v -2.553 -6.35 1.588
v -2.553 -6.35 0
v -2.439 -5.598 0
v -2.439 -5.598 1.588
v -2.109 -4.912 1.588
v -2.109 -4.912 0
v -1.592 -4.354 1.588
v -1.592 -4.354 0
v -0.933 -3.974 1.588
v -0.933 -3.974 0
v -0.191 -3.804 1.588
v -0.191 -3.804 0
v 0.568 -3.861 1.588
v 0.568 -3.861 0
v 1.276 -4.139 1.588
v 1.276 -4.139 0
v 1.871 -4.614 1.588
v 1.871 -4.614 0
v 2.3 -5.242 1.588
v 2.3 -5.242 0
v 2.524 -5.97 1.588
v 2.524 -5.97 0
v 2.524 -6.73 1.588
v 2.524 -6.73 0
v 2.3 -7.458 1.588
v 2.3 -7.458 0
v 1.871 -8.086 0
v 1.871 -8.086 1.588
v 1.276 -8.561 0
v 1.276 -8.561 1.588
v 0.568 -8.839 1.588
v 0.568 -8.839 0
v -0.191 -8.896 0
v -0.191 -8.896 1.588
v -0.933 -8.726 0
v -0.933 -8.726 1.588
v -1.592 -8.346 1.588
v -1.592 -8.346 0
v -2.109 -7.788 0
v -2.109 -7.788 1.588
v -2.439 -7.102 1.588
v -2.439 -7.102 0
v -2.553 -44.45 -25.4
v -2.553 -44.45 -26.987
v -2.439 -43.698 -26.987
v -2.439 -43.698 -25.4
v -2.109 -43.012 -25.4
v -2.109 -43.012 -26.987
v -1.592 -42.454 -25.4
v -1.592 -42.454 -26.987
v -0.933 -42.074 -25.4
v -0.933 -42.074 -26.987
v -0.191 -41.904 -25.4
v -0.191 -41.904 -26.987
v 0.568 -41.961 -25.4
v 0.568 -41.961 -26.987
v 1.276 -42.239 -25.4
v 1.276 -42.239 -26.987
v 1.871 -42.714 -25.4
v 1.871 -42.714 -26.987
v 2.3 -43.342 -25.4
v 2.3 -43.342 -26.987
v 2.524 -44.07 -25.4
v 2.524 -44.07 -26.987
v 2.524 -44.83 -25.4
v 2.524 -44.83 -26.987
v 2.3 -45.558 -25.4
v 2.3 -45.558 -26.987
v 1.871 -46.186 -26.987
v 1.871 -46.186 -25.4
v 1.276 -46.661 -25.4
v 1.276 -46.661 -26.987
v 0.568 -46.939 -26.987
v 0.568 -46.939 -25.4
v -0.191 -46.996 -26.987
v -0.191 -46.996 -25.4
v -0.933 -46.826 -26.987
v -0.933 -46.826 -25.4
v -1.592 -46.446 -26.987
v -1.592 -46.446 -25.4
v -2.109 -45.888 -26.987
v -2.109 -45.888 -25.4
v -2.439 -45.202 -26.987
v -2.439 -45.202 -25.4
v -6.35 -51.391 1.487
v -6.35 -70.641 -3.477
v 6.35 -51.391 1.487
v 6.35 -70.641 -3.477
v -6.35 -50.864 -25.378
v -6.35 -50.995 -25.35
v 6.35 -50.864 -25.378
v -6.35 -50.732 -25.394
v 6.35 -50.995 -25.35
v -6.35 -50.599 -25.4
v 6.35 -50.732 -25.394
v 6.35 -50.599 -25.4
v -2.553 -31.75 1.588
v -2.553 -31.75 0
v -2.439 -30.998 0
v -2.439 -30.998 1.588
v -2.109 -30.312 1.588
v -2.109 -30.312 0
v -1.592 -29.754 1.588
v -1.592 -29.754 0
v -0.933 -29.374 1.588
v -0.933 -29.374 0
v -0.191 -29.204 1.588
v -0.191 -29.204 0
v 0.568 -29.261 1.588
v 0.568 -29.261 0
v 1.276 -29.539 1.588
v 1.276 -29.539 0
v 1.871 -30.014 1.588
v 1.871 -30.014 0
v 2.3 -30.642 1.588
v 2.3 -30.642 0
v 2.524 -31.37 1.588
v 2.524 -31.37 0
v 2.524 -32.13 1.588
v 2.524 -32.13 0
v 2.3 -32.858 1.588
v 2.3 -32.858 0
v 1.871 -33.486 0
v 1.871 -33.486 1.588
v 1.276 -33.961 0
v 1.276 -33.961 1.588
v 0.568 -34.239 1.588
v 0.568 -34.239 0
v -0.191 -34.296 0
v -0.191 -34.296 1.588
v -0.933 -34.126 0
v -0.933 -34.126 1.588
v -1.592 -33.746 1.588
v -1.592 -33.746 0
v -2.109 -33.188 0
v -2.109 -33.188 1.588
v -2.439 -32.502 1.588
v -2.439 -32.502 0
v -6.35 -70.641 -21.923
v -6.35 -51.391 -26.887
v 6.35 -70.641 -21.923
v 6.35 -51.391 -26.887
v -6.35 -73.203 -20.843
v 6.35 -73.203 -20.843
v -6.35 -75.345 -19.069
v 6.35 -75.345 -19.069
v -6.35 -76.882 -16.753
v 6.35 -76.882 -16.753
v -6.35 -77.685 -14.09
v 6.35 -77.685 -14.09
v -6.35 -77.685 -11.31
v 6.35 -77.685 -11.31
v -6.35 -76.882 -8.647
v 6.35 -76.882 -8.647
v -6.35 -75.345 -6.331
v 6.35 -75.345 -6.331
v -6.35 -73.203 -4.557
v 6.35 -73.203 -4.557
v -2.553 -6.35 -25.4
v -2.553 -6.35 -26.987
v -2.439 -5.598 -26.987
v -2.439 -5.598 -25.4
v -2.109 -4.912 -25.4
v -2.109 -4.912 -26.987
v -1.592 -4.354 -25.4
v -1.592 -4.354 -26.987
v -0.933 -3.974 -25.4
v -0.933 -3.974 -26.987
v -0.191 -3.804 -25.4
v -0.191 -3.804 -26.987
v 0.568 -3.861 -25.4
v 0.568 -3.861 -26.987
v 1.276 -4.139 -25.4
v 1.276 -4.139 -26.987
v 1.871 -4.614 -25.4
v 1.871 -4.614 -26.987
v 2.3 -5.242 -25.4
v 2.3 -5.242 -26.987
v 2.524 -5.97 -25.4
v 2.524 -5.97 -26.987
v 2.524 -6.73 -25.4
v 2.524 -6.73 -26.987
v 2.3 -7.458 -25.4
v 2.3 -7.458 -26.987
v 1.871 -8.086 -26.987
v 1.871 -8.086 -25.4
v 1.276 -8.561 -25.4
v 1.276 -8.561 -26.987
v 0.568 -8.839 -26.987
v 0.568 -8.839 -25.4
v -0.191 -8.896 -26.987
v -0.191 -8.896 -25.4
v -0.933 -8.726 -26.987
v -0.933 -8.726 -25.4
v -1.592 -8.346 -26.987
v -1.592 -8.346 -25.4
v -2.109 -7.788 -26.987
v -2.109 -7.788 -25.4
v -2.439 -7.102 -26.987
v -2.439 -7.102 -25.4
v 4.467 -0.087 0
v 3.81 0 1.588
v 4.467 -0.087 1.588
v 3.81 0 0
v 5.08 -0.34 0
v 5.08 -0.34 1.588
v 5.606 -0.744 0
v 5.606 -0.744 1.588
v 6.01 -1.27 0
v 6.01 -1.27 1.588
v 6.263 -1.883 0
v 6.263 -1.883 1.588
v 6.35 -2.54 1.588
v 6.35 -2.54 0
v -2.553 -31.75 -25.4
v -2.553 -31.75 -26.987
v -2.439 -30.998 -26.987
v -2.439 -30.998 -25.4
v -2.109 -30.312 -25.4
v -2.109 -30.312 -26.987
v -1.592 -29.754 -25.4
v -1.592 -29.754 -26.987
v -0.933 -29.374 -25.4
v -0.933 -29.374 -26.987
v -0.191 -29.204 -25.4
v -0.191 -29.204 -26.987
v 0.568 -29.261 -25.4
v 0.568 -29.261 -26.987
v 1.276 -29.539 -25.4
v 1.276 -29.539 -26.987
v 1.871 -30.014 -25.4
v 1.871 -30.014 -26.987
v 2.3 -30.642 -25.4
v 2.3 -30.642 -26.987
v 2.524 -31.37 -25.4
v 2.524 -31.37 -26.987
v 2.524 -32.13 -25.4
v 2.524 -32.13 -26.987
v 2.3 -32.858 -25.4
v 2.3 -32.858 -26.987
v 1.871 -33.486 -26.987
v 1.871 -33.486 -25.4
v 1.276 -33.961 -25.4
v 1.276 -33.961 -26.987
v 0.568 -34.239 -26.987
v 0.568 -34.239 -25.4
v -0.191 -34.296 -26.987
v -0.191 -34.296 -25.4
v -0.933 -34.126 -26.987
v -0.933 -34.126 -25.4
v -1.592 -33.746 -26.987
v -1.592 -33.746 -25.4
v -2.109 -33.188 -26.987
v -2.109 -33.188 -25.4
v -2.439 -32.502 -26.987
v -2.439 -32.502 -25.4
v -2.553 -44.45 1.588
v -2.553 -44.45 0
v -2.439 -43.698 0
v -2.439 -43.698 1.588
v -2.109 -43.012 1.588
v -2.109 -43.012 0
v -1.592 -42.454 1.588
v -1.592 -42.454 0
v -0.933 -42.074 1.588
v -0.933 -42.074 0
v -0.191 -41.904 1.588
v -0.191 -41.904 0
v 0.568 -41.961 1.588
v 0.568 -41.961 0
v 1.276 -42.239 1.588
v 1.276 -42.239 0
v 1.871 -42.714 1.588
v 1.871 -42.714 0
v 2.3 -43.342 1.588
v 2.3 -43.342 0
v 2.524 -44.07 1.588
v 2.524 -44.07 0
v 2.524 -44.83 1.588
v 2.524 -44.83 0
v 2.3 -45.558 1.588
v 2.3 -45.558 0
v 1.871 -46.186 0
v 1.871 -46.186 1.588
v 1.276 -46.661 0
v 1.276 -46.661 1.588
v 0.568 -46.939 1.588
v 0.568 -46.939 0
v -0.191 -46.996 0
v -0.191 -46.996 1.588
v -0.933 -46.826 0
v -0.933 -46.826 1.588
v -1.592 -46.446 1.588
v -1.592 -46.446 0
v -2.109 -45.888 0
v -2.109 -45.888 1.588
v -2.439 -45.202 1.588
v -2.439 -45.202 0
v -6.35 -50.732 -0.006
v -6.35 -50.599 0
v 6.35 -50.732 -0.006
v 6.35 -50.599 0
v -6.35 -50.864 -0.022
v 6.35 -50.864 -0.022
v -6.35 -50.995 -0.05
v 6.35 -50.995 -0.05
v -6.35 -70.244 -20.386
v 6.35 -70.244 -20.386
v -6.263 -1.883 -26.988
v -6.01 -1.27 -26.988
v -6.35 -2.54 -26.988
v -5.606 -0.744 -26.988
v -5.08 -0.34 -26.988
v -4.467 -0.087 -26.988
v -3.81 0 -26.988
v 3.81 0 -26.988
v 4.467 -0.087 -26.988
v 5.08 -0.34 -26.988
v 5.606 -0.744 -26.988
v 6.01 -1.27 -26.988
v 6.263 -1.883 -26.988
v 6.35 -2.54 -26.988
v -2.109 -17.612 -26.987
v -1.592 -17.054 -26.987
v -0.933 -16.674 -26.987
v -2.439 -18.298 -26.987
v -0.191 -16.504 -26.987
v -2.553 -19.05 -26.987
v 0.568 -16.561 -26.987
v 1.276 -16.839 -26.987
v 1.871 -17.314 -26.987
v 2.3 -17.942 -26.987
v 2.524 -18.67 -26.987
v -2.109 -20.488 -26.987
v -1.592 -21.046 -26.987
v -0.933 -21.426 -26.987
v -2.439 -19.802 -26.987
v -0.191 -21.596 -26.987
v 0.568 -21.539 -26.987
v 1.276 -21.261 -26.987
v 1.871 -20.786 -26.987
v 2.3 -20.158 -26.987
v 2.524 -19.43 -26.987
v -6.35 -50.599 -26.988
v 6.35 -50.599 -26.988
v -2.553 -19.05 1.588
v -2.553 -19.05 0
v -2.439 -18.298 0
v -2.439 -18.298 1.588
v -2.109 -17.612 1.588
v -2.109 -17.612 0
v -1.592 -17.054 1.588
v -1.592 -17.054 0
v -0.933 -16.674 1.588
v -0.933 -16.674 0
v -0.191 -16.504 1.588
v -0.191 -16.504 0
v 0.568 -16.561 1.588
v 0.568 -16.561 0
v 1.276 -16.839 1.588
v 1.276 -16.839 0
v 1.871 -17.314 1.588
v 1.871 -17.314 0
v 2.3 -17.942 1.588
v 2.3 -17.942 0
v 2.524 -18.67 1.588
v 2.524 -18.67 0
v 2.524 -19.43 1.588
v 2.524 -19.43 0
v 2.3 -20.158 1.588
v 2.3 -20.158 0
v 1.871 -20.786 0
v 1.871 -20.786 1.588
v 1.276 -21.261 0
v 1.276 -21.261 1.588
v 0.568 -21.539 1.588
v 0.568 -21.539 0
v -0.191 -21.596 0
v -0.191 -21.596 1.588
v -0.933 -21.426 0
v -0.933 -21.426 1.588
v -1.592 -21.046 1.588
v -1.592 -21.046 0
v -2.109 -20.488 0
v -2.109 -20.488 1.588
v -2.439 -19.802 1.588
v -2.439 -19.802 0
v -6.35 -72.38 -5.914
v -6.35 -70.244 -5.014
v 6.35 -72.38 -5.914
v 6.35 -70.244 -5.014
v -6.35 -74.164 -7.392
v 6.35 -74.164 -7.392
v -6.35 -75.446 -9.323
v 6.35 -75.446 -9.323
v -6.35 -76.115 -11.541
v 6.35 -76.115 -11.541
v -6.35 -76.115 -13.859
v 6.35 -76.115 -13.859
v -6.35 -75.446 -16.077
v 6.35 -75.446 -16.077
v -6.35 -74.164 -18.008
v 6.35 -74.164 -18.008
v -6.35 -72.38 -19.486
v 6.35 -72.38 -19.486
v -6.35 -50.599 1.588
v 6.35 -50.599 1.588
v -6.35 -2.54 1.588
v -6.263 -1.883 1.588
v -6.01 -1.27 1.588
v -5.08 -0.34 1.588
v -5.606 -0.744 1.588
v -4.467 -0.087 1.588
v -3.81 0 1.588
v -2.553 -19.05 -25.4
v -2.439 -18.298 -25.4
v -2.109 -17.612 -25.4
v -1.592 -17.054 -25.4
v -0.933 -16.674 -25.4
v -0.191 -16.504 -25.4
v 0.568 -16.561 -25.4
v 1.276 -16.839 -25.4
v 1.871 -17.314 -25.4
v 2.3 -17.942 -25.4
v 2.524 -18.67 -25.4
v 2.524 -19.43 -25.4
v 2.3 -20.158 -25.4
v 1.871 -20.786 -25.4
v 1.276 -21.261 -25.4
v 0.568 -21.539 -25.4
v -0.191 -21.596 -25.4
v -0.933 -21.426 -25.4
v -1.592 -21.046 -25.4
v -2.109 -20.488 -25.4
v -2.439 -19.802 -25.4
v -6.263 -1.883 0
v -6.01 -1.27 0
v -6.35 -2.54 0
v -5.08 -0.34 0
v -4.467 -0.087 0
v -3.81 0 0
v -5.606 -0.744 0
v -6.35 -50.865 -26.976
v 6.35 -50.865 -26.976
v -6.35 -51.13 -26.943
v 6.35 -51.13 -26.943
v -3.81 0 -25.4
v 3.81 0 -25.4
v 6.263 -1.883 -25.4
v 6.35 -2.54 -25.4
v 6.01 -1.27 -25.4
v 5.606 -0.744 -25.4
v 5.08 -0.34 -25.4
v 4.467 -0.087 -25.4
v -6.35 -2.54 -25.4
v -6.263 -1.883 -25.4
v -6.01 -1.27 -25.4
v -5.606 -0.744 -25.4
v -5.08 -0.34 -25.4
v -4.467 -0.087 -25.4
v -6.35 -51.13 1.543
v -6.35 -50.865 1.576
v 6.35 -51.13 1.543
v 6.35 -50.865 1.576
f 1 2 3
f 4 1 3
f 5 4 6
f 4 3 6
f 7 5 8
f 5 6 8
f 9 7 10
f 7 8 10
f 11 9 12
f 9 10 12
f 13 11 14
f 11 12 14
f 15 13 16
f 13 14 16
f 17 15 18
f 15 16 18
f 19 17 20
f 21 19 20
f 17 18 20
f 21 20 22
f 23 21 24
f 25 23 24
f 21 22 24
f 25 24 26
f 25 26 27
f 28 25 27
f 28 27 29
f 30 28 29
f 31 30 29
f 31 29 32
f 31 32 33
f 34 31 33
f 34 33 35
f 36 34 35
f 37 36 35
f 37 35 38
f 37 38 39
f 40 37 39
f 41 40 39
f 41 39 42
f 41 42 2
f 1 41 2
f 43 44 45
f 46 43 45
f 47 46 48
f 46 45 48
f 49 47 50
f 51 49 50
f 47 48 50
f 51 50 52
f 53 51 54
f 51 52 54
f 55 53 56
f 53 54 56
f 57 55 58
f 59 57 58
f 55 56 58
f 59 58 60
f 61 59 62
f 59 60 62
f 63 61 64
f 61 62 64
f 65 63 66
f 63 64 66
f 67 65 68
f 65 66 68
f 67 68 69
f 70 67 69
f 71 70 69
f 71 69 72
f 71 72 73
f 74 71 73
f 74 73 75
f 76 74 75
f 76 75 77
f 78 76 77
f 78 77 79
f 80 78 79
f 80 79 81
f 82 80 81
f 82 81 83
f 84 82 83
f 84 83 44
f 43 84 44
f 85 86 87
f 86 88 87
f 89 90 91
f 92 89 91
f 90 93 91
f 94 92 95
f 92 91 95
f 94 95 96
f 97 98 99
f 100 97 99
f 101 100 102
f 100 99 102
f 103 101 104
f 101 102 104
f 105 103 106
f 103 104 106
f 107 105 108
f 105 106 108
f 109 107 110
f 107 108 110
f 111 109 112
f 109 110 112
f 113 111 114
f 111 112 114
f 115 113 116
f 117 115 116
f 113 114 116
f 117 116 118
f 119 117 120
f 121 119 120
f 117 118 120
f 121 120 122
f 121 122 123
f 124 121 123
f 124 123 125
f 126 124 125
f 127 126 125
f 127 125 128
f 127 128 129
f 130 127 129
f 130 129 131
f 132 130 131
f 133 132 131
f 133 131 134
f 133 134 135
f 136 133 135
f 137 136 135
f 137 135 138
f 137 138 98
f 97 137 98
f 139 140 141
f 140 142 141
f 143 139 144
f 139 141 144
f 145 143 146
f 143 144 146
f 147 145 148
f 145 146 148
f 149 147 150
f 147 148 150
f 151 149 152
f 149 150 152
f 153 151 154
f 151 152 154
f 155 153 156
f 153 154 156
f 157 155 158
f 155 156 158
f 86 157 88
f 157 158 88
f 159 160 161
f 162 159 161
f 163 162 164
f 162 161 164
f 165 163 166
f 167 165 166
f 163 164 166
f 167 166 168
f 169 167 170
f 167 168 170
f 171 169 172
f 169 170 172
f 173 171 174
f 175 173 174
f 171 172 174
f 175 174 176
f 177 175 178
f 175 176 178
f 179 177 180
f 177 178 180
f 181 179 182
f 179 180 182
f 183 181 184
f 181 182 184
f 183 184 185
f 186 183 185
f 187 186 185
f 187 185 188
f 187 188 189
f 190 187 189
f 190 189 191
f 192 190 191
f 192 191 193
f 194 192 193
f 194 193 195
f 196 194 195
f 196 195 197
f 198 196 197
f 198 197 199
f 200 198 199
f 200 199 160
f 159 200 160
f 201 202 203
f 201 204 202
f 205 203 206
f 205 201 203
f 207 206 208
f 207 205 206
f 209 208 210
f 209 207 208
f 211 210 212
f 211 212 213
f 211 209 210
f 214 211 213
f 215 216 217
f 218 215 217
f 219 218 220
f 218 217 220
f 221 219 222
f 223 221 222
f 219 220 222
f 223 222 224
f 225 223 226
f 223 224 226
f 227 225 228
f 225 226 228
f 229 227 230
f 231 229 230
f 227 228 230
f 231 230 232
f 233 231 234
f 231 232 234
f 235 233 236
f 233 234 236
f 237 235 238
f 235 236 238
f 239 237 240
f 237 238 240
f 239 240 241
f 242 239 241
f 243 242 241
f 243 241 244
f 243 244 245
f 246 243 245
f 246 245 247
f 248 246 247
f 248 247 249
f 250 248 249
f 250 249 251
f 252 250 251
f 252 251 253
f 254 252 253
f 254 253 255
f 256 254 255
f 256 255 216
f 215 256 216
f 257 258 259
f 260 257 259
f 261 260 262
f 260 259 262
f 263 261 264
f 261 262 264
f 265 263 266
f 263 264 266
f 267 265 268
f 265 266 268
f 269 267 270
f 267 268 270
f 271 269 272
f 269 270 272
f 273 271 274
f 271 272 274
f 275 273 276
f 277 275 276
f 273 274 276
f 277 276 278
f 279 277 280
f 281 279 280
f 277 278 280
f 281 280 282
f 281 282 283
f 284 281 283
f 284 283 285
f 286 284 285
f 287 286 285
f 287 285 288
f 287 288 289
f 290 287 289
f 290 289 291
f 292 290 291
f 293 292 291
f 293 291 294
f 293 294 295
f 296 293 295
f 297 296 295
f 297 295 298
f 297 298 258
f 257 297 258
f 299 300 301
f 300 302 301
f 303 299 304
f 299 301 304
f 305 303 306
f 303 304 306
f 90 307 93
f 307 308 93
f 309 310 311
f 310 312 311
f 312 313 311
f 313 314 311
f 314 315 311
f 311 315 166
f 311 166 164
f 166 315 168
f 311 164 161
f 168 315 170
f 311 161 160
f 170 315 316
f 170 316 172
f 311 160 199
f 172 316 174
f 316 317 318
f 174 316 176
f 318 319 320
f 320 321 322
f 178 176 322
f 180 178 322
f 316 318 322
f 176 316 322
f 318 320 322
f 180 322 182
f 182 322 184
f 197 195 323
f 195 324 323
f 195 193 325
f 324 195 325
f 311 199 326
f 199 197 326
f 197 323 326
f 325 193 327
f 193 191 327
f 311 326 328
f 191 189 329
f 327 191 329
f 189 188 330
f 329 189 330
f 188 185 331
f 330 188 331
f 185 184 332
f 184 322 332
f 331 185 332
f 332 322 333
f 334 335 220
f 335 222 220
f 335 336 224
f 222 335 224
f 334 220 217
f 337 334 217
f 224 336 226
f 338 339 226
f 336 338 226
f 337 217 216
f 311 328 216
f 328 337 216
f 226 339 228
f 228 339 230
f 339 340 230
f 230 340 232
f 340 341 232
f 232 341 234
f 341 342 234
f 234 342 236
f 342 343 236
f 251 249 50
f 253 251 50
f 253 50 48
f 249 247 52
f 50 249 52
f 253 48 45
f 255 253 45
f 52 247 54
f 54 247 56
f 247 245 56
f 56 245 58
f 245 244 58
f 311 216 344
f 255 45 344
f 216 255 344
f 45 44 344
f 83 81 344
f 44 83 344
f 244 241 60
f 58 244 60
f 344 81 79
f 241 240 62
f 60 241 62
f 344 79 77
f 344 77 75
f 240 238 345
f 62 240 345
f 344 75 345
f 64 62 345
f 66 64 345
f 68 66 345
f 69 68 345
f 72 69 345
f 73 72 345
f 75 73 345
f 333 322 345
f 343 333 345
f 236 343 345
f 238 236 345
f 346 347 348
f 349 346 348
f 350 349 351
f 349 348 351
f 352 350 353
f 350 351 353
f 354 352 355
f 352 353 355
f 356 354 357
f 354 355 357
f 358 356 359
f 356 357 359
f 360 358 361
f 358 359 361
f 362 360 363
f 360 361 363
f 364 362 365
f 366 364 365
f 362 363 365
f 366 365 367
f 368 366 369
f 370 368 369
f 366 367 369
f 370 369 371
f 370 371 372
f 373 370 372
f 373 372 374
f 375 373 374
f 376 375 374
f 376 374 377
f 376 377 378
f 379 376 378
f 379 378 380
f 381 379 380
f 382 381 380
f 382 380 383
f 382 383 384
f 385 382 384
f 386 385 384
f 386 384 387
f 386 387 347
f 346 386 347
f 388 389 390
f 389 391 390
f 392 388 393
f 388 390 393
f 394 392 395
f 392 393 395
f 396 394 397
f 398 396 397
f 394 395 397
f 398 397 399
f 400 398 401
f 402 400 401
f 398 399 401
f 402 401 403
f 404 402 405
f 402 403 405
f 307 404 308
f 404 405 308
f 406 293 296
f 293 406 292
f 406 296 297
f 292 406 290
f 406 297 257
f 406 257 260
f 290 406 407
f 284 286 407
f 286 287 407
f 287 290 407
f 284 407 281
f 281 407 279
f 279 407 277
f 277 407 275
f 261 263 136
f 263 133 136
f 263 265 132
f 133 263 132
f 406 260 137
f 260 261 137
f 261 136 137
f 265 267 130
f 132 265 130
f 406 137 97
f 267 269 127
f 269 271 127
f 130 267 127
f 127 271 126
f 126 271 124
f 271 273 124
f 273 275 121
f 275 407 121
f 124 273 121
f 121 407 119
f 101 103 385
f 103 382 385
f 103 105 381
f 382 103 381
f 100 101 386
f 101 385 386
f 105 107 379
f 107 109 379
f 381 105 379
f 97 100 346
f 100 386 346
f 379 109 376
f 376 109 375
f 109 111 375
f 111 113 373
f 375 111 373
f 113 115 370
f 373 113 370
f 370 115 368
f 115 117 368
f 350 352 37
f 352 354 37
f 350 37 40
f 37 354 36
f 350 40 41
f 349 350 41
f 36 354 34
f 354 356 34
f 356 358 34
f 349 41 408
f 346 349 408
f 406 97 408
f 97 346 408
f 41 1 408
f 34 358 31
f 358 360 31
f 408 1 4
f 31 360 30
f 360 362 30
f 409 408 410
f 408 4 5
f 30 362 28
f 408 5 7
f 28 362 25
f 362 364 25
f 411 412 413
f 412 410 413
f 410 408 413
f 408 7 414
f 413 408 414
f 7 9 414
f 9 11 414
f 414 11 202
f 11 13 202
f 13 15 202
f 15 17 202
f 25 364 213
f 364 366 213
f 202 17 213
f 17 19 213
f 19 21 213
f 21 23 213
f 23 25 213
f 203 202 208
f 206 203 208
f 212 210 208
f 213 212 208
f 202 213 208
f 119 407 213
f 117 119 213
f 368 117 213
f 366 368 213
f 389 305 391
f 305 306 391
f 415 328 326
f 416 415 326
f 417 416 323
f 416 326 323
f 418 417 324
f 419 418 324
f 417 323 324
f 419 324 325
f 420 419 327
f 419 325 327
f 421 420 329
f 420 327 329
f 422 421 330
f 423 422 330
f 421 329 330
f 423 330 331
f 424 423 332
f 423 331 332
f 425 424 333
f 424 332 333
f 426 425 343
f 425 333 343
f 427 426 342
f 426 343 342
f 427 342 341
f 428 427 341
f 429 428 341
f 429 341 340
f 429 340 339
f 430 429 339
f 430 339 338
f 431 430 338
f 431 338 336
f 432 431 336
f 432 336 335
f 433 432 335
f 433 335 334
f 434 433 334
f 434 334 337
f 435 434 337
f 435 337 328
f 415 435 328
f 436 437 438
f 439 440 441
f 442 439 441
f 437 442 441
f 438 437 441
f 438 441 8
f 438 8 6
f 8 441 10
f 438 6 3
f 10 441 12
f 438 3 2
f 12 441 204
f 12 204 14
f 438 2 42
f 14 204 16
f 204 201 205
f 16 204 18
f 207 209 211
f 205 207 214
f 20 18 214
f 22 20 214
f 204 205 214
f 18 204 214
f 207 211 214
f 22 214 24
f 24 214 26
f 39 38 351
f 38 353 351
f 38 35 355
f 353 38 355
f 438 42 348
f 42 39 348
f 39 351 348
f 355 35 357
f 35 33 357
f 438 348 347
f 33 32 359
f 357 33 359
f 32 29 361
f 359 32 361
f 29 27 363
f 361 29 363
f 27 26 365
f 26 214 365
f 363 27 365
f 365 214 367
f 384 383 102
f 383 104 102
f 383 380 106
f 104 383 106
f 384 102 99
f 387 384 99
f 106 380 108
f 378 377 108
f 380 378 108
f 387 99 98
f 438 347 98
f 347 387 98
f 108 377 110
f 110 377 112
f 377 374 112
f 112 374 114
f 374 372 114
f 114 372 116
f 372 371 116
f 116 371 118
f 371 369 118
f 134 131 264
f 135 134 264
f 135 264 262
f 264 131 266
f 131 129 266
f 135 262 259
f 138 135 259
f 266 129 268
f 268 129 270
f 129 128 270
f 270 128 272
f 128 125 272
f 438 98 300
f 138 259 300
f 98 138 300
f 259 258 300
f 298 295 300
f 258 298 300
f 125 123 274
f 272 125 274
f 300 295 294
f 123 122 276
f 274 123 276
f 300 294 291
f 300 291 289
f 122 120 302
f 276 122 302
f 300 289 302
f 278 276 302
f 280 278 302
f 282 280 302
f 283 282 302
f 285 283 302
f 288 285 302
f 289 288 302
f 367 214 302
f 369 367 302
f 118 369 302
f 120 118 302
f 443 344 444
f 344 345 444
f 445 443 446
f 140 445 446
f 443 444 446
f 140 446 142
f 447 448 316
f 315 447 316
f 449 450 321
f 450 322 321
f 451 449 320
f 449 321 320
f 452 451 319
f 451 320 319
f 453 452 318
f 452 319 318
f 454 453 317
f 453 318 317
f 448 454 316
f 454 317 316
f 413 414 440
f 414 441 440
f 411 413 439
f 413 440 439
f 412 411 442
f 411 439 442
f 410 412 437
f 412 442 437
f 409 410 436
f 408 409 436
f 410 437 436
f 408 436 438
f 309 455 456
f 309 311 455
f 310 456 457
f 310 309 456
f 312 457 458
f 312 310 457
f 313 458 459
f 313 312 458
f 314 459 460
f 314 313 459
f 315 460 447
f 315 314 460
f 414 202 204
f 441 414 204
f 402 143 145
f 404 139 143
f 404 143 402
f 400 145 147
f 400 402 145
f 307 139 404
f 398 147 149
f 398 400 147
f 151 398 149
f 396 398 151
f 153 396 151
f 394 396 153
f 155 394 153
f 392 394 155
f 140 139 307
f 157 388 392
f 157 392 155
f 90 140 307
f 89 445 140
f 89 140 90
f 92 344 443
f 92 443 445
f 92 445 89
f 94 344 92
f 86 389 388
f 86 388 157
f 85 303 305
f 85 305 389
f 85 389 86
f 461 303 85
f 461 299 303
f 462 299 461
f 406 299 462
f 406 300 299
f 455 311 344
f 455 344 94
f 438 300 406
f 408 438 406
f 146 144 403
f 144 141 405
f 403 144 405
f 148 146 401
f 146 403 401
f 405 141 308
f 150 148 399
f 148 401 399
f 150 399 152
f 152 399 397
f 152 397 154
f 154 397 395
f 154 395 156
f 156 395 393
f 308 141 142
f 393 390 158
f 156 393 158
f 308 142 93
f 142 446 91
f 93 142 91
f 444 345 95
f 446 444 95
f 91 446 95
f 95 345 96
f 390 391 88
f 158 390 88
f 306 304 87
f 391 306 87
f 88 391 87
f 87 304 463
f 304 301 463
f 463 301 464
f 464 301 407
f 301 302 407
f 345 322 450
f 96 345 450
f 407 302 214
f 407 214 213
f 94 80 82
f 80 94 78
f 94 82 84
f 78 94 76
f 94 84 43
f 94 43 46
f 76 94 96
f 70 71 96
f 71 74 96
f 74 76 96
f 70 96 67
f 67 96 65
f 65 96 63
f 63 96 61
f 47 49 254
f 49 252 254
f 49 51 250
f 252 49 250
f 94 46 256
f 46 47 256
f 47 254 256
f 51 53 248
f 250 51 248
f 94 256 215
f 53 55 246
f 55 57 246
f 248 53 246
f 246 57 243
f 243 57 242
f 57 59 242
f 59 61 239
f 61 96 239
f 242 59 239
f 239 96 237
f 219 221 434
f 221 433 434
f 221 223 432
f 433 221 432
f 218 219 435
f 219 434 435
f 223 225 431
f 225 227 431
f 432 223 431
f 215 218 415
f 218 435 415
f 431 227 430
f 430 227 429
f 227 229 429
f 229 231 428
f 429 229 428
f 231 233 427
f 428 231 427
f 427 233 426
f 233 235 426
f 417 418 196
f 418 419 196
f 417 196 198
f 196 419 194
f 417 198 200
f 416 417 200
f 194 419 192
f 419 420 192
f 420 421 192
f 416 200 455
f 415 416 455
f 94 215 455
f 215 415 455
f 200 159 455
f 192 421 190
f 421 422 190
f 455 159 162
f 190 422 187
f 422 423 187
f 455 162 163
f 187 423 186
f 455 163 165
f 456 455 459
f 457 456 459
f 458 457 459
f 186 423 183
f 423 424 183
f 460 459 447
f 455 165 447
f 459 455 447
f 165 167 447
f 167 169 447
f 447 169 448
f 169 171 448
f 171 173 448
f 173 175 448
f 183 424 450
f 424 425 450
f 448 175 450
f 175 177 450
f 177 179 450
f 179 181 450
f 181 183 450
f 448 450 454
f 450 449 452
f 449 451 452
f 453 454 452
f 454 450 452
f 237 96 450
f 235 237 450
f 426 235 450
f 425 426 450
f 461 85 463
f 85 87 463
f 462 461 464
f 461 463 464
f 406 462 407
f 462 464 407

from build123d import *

# Parameters (mm, degrees)
BASE_FLANGE1_DEPTH     = 6.35
F_10_CLEARANCE_HOLE1_D = 5.1054
FILLET1_R              = 2.54


# Sheet-metal steps are written as plain solids
with BuildPart() as part:
    # Sketch1 → Base-Flange1 (new, symmetric)
    with BuildSketch(Plane(origin=(0, 0, 0), x_dir=(0, 0, -1), z_dir=(1, 0, 0))):
        with BuildLine():
            Line((0, 0), (0, -50.59861822))
            ThreePointArc((0, -50.59861822), (0.012620988, -50.798398969), (0.050283273, -50.995003112))
            Line((0.050283273, -50.995003112), (5.013916363, -70.244424463))
            ThreePointArc((5.013916363, -70.244424463), (12.7, -76.2), (20.386083637, -70.244424463))
            Line((20.386083637, -70.244424463), (25.349716727, -50.995003112))
            ThreePointArc((25.349716727, -50.995003112), (25.387379012, -50.798398969), (25.4, -50.59861822))
            Line((25.4, -50.59861822), (25.4, 0))
            Line((25.4, 0), (26.9875, 0))
            Line((26.9875, 0), (26.9875, -50.59861822))
            ThreePointArc((26.9875, -50.59861822), (26.962258024, -50.998179718), (26.886933455, -51.391388005))
            Line((26.886933455, -51.391388005), (21.923300364, -70.640809356))
            ThreePointArc((21.923300364, -70.640809356), (12.7, -77.7875), (3.476699636, -70.640809356))
            Line((3.476699636, -70.640809356), (-1.486933455, -51.391388005))
            ThreePointArc((-1.486933455, -51.391388005), (-1.562258024, -50.998179718), (-1.5875, -50.59861822))
            Line((-1.5875, -50.59861822), (-1.5875, 0))
            Line((-1.5875, 0), (0, 0))
        make_face()
    extrude(amount=BASE_FLANGE1_DEPTH, both=True)

    # #10 Clearance Hole1 (through all)
    with Locations(Plane.XY.offset(1.5875)):
        with Locations((0, -6.35), (0, -19.05), (0, -31.75), (0, -44.45)):
            Hole(F_10_CLEARANCE_HOLE1_D / 2)

    # Fillet1
    fillet1_edges = [part.edges().sort_by_distance(p)[0] for p in [
        (-6.35, 0, 0.79375),
        (-6.35, 0, -26.19375),
        (6.35, 0, 0.79375),
        (6.35, 0, -26.19375),
    ]]
    fillet(fillet1_edges, radius=FILLET1_R)


solid = part.part
